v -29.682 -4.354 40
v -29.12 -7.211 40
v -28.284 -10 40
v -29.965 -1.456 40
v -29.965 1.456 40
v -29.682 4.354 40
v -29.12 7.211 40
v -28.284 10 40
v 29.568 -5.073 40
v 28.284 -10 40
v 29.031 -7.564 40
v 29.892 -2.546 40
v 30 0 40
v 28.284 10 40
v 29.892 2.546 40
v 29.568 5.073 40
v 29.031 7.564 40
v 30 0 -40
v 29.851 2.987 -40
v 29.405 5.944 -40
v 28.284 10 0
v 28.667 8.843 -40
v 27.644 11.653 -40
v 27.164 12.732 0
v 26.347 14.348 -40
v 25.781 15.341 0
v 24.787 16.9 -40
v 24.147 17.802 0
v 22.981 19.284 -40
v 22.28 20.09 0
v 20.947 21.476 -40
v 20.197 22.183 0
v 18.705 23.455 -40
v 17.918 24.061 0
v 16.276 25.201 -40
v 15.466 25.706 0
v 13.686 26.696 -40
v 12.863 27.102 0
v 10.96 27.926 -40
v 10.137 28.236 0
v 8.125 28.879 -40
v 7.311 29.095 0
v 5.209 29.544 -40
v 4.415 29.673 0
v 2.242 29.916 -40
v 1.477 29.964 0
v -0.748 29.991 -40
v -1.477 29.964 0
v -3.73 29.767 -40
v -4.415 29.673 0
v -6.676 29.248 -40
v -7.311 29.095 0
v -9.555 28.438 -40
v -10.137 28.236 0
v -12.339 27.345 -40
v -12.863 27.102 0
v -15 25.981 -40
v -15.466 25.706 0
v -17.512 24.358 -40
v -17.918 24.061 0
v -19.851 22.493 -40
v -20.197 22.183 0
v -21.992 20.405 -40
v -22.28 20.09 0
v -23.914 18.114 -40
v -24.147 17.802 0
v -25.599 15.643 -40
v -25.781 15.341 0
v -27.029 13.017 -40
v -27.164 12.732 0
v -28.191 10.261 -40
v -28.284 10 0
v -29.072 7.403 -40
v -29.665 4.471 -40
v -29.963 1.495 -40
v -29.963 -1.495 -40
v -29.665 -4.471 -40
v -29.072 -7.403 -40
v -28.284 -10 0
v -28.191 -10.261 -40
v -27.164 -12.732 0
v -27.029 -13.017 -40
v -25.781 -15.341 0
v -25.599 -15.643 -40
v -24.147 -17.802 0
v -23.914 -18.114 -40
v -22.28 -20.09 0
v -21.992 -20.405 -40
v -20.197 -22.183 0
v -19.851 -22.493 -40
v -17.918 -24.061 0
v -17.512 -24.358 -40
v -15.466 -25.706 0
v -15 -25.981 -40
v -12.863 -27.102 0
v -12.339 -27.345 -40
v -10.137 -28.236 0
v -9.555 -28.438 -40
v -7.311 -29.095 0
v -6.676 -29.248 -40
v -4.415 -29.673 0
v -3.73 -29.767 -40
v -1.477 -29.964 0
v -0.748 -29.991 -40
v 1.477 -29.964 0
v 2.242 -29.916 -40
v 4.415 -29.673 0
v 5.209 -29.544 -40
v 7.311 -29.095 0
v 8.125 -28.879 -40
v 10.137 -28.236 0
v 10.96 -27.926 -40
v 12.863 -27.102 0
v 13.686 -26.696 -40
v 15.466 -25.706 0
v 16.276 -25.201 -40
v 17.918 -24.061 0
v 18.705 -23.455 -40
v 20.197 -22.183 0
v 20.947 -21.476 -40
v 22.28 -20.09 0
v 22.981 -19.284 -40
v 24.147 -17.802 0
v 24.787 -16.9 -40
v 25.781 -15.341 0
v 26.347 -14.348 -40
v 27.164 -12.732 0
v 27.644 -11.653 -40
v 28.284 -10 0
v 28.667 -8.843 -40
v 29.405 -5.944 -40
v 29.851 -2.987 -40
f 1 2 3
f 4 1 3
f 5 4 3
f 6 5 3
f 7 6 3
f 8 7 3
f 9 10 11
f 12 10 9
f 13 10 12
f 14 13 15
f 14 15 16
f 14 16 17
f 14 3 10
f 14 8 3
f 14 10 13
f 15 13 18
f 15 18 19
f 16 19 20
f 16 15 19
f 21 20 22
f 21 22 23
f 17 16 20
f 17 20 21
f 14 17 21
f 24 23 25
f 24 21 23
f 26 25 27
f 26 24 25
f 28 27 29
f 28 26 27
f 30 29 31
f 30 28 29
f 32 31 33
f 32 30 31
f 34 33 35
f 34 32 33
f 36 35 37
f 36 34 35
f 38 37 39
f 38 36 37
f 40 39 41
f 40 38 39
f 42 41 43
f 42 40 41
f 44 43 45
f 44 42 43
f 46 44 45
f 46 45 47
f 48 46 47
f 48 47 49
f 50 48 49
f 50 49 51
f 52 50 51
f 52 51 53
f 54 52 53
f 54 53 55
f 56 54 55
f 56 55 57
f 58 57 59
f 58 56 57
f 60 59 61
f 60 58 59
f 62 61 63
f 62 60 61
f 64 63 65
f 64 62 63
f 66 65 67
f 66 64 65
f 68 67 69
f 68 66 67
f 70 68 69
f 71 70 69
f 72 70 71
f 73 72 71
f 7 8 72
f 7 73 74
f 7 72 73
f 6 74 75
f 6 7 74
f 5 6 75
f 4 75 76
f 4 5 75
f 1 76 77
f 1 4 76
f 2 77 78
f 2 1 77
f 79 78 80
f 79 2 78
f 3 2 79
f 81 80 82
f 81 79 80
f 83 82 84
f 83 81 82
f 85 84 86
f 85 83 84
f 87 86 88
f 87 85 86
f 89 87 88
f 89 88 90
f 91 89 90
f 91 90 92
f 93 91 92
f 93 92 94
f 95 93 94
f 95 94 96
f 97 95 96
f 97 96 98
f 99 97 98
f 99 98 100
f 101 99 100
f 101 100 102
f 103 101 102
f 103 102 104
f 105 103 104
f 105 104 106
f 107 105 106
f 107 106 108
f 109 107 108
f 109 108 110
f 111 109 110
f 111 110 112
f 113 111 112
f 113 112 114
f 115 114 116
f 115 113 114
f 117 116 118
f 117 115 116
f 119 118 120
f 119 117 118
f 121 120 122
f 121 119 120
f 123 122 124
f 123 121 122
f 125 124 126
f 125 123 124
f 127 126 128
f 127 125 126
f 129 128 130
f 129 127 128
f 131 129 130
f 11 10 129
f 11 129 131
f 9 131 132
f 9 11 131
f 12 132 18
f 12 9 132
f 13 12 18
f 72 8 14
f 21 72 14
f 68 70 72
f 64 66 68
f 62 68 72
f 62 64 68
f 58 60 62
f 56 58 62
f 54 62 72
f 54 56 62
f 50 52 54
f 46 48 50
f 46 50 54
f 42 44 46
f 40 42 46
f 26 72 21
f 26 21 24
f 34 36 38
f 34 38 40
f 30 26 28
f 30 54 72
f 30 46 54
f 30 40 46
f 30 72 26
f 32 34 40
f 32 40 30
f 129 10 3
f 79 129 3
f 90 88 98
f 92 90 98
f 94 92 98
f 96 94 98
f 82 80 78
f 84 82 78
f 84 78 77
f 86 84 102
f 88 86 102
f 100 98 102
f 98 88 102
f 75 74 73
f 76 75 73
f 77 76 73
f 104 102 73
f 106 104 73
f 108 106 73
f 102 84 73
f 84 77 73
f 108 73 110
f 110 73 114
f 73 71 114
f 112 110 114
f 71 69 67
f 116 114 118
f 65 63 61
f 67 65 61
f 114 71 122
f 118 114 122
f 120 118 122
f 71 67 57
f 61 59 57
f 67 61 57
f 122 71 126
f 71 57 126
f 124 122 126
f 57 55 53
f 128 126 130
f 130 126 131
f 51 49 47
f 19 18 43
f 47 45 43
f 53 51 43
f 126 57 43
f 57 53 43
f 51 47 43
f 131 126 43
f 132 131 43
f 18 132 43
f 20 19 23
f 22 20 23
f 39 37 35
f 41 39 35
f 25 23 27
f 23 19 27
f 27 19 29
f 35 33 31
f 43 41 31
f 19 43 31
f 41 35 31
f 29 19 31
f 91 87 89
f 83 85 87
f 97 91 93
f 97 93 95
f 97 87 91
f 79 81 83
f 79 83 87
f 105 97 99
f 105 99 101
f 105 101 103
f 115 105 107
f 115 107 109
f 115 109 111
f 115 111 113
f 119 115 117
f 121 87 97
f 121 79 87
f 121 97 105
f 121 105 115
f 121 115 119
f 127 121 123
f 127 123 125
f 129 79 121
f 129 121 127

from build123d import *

# Parameters (mm, degrees)
F0_R     = 30
F1_DEPTH = 40
F3_DEPTH = 40


with BuildPart() as f1:
    # F0 (on Top) → F1 (new body, symmetric)
    with BuildSketch(Plane.XY):
        Circle(F0_R)
    extrude(amount=F1_DEPTH, both=True)

    # F2 (on face) → F3 (cut)
    with BuildSketch(Plane.XY.offset(40)):
        with BuildLine():
            Line((-28.284271, 10), (28.284271, 10))
            ThreePointArc((28.284271, 10), (0, 30), (-28.284271, 10))
        make_face()
        with BuildLine():
            ThreePointArc((-28.284271, -10), (0, -30), (28.284271, -10))
            Line((28.284271, -10), (-28.284271, -10))
        make_face()
    extrude(amount=-F3_DEPTH, mode=Mode.SUBTRACT)


solid = f1.part
